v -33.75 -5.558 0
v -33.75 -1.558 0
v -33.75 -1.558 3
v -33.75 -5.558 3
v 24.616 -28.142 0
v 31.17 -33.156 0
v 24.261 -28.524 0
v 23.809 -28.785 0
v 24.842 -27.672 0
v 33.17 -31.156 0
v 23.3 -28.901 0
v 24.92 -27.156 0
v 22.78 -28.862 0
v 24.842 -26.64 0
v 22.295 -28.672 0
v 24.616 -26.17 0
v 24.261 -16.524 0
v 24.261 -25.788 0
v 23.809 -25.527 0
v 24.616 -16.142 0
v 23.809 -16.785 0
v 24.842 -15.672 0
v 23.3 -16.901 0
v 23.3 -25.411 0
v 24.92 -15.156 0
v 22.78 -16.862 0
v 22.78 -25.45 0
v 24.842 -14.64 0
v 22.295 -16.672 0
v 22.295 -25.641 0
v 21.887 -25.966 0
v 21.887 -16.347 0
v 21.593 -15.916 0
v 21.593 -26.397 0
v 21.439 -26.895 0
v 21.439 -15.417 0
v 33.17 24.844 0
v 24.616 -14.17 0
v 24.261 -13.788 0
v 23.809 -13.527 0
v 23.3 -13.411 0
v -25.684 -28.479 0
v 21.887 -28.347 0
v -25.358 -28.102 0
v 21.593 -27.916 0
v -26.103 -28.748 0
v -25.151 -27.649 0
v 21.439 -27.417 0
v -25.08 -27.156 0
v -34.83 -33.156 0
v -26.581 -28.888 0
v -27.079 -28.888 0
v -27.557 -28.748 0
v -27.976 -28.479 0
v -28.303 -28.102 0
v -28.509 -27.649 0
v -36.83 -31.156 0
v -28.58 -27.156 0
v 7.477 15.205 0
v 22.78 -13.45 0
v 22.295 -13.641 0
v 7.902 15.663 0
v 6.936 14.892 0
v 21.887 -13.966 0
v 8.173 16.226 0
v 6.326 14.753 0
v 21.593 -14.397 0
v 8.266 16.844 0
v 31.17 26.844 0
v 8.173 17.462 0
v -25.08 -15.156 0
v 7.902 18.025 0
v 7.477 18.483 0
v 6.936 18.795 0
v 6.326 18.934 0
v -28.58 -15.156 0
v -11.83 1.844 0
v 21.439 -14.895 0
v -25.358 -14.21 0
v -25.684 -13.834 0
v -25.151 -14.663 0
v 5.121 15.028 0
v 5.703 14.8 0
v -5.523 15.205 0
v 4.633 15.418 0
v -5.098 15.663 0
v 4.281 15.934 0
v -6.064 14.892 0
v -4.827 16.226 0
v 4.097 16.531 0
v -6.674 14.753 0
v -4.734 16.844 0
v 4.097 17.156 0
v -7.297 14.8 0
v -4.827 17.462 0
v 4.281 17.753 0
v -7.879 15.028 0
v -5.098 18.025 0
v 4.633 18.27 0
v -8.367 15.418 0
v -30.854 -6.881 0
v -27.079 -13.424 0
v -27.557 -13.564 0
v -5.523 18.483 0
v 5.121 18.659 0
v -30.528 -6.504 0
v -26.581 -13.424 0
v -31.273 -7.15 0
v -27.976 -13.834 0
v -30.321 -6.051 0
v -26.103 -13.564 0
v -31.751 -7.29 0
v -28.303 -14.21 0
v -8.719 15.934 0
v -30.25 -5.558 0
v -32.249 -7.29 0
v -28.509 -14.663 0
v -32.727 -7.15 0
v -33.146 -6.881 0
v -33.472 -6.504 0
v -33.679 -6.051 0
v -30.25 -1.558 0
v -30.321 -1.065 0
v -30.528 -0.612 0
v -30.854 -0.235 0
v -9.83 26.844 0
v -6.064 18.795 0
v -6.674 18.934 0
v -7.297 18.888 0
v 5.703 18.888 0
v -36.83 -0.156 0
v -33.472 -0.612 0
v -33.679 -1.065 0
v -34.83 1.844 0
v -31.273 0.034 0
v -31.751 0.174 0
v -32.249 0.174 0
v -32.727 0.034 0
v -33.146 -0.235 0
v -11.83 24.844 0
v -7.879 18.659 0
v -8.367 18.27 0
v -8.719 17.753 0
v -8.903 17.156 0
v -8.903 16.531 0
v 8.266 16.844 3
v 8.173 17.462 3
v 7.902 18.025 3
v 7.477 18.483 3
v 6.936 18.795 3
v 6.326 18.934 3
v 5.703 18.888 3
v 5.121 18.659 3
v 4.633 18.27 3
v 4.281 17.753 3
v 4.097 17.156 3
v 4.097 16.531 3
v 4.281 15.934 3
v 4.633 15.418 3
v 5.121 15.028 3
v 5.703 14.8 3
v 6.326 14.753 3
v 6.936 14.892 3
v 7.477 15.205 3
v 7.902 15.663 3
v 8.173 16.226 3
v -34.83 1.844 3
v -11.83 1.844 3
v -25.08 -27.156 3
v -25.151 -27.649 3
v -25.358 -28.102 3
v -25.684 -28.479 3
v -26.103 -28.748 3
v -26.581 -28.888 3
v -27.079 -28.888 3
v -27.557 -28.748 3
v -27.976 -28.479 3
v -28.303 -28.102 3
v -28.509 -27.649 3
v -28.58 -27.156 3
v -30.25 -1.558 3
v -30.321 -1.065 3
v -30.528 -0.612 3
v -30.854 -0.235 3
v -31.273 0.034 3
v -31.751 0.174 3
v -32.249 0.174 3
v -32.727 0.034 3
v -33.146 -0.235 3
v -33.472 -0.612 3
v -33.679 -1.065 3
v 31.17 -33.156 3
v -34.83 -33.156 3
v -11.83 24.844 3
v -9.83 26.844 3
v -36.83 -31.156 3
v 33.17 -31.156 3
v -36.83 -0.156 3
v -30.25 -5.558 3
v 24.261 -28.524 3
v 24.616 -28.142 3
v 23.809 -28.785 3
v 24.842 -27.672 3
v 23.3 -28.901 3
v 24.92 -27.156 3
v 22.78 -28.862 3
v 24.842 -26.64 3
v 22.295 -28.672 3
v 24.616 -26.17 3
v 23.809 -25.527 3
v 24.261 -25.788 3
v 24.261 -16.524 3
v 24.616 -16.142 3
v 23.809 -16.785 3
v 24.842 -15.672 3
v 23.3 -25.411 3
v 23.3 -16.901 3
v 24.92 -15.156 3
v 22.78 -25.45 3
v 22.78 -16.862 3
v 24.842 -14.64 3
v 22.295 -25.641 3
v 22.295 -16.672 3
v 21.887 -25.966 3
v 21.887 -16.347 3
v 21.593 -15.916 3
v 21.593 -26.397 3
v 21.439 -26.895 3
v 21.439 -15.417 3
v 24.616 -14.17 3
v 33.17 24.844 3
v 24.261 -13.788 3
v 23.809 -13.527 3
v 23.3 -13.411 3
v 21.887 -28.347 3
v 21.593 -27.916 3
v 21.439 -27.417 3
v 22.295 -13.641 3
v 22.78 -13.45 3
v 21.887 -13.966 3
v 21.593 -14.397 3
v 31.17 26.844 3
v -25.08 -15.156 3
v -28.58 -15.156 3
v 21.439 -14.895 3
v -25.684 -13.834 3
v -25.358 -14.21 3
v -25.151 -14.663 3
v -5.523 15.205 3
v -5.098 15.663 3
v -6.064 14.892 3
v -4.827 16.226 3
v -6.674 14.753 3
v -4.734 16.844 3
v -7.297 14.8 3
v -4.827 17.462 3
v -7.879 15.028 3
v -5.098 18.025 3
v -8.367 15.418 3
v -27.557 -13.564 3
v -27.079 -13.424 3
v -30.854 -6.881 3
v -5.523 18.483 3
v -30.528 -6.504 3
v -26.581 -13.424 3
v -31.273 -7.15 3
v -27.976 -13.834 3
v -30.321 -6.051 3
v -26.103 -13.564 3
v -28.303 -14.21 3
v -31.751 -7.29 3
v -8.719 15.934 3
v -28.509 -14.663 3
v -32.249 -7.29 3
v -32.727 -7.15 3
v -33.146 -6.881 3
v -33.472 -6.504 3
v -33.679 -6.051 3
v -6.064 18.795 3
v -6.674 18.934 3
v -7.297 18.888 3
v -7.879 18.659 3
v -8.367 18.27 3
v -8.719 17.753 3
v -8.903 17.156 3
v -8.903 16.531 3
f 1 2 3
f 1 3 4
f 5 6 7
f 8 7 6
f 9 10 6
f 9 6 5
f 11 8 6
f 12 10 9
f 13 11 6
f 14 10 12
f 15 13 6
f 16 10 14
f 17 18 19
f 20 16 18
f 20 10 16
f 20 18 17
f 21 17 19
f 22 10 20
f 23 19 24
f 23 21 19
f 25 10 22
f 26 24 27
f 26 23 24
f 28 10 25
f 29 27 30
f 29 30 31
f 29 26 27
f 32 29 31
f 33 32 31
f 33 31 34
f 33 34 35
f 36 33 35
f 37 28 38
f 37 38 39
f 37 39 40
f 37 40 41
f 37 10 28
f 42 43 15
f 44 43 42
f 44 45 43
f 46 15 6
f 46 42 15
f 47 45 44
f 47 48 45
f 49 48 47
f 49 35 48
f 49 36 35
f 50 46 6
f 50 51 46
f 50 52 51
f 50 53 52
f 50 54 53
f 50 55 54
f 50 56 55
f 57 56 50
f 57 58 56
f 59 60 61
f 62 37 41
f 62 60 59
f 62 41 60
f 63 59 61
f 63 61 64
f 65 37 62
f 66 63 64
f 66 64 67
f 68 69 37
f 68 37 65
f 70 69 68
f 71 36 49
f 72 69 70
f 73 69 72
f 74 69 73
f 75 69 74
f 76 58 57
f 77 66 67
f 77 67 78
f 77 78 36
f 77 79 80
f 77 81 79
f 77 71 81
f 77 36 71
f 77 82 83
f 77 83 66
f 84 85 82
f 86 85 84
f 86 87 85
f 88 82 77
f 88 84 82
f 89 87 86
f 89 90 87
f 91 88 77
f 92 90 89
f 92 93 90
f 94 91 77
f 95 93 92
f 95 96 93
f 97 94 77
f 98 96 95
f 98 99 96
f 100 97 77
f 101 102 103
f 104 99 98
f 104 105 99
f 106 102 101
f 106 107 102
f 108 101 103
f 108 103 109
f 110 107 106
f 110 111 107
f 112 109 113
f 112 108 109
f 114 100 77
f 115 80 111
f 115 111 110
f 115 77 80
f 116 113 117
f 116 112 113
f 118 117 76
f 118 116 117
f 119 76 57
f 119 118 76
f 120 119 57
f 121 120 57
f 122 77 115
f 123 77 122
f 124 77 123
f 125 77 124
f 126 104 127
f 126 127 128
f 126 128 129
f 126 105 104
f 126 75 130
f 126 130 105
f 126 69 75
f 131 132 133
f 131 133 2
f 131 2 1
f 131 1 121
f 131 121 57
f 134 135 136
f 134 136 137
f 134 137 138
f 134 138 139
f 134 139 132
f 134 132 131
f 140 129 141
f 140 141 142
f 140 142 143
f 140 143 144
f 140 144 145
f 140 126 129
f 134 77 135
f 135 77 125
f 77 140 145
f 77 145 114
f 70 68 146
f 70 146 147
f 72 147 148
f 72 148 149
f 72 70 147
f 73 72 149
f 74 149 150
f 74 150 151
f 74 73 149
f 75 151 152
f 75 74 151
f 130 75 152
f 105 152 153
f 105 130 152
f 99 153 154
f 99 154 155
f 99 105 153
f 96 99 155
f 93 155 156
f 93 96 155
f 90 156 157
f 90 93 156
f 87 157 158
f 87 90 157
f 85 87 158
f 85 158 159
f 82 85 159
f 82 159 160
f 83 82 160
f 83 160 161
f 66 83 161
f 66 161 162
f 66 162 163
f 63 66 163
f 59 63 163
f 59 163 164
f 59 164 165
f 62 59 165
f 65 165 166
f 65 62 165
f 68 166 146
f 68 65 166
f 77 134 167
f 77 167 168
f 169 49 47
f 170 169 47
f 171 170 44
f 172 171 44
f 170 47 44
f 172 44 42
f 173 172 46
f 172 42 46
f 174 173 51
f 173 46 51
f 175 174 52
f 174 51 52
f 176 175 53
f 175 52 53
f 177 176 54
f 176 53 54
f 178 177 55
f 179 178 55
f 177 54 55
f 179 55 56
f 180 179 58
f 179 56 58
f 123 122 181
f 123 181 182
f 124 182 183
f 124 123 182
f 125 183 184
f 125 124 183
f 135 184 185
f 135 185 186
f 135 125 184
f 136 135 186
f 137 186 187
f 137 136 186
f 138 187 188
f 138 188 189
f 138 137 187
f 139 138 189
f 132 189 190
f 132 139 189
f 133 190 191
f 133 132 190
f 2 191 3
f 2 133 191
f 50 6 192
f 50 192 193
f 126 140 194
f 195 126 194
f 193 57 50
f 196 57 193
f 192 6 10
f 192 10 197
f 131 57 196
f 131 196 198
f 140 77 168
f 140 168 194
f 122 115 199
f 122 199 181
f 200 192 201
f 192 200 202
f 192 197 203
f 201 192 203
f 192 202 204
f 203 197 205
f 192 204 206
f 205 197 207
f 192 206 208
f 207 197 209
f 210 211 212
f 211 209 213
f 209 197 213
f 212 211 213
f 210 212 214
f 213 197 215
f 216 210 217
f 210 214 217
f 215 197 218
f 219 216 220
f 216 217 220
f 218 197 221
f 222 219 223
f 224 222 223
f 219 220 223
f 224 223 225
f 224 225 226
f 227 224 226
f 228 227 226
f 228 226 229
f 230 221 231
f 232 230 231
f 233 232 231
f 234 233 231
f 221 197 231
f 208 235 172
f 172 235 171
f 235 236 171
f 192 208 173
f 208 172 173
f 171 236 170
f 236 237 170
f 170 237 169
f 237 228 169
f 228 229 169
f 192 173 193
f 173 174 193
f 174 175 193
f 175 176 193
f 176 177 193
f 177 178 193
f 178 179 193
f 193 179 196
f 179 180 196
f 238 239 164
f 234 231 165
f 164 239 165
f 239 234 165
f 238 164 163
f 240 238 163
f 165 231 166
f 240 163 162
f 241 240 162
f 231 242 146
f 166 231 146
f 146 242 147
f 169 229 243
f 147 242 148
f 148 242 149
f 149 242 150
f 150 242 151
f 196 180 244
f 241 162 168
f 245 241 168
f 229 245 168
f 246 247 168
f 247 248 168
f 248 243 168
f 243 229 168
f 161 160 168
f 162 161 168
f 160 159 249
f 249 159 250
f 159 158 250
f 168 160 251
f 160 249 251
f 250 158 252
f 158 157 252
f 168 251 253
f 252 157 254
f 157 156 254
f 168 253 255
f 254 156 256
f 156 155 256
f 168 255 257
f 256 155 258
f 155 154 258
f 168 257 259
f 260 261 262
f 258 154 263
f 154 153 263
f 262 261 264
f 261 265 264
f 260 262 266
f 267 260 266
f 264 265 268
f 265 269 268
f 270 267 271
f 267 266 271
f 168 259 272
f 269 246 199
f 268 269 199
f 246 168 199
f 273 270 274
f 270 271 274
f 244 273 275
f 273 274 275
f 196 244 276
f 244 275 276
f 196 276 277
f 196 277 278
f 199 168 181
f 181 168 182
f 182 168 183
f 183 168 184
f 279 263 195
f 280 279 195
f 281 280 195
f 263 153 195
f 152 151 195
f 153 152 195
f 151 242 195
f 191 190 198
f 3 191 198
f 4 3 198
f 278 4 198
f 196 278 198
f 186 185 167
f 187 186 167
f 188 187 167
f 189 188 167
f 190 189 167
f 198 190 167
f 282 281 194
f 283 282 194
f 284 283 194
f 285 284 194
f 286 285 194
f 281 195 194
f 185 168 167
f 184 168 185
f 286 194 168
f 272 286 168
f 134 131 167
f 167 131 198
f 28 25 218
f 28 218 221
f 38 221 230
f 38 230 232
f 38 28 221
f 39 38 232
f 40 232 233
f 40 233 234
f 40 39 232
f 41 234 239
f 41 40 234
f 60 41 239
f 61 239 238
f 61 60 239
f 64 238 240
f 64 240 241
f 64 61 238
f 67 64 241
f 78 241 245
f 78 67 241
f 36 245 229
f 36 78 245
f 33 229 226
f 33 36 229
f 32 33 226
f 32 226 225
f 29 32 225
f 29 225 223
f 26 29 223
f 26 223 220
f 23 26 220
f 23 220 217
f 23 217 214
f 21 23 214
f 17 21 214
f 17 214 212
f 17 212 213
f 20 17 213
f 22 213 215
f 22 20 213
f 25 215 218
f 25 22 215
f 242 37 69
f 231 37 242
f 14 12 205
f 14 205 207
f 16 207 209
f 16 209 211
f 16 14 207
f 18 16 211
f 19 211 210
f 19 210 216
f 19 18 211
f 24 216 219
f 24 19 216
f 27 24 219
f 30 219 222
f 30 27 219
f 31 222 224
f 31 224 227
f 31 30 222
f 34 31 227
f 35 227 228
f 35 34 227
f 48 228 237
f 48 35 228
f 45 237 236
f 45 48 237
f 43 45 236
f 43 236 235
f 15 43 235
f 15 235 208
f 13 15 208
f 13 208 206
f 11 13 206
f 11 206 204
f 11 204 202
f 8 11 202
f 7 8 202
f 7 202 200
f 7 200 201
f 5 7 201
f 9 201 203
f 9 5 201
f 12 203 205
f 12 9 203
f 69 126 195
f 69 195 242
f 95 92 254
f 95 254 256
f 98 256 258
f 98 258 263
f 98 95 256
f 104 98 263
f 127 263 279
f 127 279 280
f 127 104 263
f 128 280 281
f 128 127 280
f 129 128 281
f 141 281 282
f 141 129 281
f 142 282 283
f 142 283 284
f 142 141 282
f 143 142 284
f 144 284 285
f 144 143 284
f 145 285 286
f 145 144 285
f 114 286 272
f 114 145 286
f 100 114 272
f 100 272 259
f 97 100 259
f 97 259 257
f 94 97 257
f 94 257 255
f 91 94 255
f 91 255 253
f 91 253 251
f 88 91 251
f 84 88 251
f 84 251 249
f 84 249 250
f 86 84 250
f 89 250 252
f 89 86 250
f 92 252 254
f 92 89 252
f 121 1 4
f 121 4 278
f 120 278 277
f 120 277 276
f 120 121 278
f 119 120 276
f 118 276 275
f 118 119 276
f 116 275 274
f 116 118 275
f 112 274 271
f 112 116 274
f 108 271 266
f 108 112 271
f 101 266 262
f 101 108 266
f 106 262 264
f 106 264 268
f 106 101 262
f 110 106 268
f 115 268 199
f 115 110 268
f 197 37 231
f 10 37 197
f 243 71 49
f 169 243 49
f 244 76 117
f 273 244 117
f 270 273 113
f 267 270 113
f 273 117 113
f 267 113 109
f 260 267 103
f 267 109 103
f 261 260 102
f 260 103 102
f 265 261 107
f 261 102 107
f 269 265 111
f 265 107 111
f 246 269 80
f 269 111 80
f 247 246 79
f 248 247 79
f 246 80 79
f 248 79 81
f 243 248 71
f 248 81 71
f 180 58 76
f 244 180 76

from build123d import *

# Parameters (mm, degrees)
SKETCH1_R           = 1.75
SKETCH1_R_2         = 2.096313729
BOSS_EXTRUDE1_DEPTH = 3
CHAMFER1_SIZE       = 2


with BuildPart() as part:
    # Sketch1 → Boss-Extrude1 (new body)
    with BuildSketch(Plane.XY):
        Polygon((-11.830357143, 26.84375), (33.169642857, 26.84375), (33.169642857, -33.15625), (-36.830357143, -33.15625), (-36.830357143, 1.84375), (-11.830357143, 1.84375), align=None)
        with Locations((23.169642857, -15.15625)):
            Circle(SKETCH1_R, mode=Mode.SUBTRACT)
        with Locations((23.169642857, -27.15625)):
            Circle(SKETCH1_R, mode=Mode.SUBTRACT)
        with Locations((6.169642857, 16.84375)):
            Circle(SKETCH1_R_2, mode=Mode.SUBTRACT)
        with Locations((-6.830357143, 16.84375)):
            Circle(SKETCH1_R_2, mode=Mode.SUBTRACT)
        with BuildLine():
            Line((-25.080357143, -15.15625), (-25.080357143, -27.15625))
            ThreePointArc((-25.080357143, -27.15625), (-26.830357143, -28.90625), (-28.580357143, -27.15625))
            Line((-28.580357143, -27.15625), (-28.580357143, -15.15625))
            ThreePointArc((-28.580357143, -15.15625), (-26.830357143, -13.40625), (-25.080357143, -15.15625))
        make_face(mode=Mode.SUBTRACT)
        with BuildLine():
            Line((-33.75, -1.558035714), (-33.75, -5.558035714))
            ThreePointArc((-33.75, -5.558035714), (-32, -7.308035714), (-30.25, -5.558035714))
            Line((-30.25, -5.558035714), (-30.25, -1.558035714))
            ThreePointArc((-30.25, -1.558035714), (-32, 0.191964286), (-33.75, -1.558035714))
        make_face(mode=Mode.SUBTRACT)
    extrude(amount=BOSS_EXTRUDE1_DEPTH)

    # Chamfer1
    chamfer1_edges = [part.edges().sort_by_distance(p)[0] for p in [
        (-11.830357143, 26.84375, 1.5),
        (33.169642857, 26.84375, 1.5),
        (33.169642857, -33.15625, 1.5),
        (-36.830357143, -33.15625, 1.5),
        (-36.830357143, 1.84375, 1.5),
    ]]
    chamfer(chamfer1_edges, length=CHAMFER1_SIZE)


solid = part.part
